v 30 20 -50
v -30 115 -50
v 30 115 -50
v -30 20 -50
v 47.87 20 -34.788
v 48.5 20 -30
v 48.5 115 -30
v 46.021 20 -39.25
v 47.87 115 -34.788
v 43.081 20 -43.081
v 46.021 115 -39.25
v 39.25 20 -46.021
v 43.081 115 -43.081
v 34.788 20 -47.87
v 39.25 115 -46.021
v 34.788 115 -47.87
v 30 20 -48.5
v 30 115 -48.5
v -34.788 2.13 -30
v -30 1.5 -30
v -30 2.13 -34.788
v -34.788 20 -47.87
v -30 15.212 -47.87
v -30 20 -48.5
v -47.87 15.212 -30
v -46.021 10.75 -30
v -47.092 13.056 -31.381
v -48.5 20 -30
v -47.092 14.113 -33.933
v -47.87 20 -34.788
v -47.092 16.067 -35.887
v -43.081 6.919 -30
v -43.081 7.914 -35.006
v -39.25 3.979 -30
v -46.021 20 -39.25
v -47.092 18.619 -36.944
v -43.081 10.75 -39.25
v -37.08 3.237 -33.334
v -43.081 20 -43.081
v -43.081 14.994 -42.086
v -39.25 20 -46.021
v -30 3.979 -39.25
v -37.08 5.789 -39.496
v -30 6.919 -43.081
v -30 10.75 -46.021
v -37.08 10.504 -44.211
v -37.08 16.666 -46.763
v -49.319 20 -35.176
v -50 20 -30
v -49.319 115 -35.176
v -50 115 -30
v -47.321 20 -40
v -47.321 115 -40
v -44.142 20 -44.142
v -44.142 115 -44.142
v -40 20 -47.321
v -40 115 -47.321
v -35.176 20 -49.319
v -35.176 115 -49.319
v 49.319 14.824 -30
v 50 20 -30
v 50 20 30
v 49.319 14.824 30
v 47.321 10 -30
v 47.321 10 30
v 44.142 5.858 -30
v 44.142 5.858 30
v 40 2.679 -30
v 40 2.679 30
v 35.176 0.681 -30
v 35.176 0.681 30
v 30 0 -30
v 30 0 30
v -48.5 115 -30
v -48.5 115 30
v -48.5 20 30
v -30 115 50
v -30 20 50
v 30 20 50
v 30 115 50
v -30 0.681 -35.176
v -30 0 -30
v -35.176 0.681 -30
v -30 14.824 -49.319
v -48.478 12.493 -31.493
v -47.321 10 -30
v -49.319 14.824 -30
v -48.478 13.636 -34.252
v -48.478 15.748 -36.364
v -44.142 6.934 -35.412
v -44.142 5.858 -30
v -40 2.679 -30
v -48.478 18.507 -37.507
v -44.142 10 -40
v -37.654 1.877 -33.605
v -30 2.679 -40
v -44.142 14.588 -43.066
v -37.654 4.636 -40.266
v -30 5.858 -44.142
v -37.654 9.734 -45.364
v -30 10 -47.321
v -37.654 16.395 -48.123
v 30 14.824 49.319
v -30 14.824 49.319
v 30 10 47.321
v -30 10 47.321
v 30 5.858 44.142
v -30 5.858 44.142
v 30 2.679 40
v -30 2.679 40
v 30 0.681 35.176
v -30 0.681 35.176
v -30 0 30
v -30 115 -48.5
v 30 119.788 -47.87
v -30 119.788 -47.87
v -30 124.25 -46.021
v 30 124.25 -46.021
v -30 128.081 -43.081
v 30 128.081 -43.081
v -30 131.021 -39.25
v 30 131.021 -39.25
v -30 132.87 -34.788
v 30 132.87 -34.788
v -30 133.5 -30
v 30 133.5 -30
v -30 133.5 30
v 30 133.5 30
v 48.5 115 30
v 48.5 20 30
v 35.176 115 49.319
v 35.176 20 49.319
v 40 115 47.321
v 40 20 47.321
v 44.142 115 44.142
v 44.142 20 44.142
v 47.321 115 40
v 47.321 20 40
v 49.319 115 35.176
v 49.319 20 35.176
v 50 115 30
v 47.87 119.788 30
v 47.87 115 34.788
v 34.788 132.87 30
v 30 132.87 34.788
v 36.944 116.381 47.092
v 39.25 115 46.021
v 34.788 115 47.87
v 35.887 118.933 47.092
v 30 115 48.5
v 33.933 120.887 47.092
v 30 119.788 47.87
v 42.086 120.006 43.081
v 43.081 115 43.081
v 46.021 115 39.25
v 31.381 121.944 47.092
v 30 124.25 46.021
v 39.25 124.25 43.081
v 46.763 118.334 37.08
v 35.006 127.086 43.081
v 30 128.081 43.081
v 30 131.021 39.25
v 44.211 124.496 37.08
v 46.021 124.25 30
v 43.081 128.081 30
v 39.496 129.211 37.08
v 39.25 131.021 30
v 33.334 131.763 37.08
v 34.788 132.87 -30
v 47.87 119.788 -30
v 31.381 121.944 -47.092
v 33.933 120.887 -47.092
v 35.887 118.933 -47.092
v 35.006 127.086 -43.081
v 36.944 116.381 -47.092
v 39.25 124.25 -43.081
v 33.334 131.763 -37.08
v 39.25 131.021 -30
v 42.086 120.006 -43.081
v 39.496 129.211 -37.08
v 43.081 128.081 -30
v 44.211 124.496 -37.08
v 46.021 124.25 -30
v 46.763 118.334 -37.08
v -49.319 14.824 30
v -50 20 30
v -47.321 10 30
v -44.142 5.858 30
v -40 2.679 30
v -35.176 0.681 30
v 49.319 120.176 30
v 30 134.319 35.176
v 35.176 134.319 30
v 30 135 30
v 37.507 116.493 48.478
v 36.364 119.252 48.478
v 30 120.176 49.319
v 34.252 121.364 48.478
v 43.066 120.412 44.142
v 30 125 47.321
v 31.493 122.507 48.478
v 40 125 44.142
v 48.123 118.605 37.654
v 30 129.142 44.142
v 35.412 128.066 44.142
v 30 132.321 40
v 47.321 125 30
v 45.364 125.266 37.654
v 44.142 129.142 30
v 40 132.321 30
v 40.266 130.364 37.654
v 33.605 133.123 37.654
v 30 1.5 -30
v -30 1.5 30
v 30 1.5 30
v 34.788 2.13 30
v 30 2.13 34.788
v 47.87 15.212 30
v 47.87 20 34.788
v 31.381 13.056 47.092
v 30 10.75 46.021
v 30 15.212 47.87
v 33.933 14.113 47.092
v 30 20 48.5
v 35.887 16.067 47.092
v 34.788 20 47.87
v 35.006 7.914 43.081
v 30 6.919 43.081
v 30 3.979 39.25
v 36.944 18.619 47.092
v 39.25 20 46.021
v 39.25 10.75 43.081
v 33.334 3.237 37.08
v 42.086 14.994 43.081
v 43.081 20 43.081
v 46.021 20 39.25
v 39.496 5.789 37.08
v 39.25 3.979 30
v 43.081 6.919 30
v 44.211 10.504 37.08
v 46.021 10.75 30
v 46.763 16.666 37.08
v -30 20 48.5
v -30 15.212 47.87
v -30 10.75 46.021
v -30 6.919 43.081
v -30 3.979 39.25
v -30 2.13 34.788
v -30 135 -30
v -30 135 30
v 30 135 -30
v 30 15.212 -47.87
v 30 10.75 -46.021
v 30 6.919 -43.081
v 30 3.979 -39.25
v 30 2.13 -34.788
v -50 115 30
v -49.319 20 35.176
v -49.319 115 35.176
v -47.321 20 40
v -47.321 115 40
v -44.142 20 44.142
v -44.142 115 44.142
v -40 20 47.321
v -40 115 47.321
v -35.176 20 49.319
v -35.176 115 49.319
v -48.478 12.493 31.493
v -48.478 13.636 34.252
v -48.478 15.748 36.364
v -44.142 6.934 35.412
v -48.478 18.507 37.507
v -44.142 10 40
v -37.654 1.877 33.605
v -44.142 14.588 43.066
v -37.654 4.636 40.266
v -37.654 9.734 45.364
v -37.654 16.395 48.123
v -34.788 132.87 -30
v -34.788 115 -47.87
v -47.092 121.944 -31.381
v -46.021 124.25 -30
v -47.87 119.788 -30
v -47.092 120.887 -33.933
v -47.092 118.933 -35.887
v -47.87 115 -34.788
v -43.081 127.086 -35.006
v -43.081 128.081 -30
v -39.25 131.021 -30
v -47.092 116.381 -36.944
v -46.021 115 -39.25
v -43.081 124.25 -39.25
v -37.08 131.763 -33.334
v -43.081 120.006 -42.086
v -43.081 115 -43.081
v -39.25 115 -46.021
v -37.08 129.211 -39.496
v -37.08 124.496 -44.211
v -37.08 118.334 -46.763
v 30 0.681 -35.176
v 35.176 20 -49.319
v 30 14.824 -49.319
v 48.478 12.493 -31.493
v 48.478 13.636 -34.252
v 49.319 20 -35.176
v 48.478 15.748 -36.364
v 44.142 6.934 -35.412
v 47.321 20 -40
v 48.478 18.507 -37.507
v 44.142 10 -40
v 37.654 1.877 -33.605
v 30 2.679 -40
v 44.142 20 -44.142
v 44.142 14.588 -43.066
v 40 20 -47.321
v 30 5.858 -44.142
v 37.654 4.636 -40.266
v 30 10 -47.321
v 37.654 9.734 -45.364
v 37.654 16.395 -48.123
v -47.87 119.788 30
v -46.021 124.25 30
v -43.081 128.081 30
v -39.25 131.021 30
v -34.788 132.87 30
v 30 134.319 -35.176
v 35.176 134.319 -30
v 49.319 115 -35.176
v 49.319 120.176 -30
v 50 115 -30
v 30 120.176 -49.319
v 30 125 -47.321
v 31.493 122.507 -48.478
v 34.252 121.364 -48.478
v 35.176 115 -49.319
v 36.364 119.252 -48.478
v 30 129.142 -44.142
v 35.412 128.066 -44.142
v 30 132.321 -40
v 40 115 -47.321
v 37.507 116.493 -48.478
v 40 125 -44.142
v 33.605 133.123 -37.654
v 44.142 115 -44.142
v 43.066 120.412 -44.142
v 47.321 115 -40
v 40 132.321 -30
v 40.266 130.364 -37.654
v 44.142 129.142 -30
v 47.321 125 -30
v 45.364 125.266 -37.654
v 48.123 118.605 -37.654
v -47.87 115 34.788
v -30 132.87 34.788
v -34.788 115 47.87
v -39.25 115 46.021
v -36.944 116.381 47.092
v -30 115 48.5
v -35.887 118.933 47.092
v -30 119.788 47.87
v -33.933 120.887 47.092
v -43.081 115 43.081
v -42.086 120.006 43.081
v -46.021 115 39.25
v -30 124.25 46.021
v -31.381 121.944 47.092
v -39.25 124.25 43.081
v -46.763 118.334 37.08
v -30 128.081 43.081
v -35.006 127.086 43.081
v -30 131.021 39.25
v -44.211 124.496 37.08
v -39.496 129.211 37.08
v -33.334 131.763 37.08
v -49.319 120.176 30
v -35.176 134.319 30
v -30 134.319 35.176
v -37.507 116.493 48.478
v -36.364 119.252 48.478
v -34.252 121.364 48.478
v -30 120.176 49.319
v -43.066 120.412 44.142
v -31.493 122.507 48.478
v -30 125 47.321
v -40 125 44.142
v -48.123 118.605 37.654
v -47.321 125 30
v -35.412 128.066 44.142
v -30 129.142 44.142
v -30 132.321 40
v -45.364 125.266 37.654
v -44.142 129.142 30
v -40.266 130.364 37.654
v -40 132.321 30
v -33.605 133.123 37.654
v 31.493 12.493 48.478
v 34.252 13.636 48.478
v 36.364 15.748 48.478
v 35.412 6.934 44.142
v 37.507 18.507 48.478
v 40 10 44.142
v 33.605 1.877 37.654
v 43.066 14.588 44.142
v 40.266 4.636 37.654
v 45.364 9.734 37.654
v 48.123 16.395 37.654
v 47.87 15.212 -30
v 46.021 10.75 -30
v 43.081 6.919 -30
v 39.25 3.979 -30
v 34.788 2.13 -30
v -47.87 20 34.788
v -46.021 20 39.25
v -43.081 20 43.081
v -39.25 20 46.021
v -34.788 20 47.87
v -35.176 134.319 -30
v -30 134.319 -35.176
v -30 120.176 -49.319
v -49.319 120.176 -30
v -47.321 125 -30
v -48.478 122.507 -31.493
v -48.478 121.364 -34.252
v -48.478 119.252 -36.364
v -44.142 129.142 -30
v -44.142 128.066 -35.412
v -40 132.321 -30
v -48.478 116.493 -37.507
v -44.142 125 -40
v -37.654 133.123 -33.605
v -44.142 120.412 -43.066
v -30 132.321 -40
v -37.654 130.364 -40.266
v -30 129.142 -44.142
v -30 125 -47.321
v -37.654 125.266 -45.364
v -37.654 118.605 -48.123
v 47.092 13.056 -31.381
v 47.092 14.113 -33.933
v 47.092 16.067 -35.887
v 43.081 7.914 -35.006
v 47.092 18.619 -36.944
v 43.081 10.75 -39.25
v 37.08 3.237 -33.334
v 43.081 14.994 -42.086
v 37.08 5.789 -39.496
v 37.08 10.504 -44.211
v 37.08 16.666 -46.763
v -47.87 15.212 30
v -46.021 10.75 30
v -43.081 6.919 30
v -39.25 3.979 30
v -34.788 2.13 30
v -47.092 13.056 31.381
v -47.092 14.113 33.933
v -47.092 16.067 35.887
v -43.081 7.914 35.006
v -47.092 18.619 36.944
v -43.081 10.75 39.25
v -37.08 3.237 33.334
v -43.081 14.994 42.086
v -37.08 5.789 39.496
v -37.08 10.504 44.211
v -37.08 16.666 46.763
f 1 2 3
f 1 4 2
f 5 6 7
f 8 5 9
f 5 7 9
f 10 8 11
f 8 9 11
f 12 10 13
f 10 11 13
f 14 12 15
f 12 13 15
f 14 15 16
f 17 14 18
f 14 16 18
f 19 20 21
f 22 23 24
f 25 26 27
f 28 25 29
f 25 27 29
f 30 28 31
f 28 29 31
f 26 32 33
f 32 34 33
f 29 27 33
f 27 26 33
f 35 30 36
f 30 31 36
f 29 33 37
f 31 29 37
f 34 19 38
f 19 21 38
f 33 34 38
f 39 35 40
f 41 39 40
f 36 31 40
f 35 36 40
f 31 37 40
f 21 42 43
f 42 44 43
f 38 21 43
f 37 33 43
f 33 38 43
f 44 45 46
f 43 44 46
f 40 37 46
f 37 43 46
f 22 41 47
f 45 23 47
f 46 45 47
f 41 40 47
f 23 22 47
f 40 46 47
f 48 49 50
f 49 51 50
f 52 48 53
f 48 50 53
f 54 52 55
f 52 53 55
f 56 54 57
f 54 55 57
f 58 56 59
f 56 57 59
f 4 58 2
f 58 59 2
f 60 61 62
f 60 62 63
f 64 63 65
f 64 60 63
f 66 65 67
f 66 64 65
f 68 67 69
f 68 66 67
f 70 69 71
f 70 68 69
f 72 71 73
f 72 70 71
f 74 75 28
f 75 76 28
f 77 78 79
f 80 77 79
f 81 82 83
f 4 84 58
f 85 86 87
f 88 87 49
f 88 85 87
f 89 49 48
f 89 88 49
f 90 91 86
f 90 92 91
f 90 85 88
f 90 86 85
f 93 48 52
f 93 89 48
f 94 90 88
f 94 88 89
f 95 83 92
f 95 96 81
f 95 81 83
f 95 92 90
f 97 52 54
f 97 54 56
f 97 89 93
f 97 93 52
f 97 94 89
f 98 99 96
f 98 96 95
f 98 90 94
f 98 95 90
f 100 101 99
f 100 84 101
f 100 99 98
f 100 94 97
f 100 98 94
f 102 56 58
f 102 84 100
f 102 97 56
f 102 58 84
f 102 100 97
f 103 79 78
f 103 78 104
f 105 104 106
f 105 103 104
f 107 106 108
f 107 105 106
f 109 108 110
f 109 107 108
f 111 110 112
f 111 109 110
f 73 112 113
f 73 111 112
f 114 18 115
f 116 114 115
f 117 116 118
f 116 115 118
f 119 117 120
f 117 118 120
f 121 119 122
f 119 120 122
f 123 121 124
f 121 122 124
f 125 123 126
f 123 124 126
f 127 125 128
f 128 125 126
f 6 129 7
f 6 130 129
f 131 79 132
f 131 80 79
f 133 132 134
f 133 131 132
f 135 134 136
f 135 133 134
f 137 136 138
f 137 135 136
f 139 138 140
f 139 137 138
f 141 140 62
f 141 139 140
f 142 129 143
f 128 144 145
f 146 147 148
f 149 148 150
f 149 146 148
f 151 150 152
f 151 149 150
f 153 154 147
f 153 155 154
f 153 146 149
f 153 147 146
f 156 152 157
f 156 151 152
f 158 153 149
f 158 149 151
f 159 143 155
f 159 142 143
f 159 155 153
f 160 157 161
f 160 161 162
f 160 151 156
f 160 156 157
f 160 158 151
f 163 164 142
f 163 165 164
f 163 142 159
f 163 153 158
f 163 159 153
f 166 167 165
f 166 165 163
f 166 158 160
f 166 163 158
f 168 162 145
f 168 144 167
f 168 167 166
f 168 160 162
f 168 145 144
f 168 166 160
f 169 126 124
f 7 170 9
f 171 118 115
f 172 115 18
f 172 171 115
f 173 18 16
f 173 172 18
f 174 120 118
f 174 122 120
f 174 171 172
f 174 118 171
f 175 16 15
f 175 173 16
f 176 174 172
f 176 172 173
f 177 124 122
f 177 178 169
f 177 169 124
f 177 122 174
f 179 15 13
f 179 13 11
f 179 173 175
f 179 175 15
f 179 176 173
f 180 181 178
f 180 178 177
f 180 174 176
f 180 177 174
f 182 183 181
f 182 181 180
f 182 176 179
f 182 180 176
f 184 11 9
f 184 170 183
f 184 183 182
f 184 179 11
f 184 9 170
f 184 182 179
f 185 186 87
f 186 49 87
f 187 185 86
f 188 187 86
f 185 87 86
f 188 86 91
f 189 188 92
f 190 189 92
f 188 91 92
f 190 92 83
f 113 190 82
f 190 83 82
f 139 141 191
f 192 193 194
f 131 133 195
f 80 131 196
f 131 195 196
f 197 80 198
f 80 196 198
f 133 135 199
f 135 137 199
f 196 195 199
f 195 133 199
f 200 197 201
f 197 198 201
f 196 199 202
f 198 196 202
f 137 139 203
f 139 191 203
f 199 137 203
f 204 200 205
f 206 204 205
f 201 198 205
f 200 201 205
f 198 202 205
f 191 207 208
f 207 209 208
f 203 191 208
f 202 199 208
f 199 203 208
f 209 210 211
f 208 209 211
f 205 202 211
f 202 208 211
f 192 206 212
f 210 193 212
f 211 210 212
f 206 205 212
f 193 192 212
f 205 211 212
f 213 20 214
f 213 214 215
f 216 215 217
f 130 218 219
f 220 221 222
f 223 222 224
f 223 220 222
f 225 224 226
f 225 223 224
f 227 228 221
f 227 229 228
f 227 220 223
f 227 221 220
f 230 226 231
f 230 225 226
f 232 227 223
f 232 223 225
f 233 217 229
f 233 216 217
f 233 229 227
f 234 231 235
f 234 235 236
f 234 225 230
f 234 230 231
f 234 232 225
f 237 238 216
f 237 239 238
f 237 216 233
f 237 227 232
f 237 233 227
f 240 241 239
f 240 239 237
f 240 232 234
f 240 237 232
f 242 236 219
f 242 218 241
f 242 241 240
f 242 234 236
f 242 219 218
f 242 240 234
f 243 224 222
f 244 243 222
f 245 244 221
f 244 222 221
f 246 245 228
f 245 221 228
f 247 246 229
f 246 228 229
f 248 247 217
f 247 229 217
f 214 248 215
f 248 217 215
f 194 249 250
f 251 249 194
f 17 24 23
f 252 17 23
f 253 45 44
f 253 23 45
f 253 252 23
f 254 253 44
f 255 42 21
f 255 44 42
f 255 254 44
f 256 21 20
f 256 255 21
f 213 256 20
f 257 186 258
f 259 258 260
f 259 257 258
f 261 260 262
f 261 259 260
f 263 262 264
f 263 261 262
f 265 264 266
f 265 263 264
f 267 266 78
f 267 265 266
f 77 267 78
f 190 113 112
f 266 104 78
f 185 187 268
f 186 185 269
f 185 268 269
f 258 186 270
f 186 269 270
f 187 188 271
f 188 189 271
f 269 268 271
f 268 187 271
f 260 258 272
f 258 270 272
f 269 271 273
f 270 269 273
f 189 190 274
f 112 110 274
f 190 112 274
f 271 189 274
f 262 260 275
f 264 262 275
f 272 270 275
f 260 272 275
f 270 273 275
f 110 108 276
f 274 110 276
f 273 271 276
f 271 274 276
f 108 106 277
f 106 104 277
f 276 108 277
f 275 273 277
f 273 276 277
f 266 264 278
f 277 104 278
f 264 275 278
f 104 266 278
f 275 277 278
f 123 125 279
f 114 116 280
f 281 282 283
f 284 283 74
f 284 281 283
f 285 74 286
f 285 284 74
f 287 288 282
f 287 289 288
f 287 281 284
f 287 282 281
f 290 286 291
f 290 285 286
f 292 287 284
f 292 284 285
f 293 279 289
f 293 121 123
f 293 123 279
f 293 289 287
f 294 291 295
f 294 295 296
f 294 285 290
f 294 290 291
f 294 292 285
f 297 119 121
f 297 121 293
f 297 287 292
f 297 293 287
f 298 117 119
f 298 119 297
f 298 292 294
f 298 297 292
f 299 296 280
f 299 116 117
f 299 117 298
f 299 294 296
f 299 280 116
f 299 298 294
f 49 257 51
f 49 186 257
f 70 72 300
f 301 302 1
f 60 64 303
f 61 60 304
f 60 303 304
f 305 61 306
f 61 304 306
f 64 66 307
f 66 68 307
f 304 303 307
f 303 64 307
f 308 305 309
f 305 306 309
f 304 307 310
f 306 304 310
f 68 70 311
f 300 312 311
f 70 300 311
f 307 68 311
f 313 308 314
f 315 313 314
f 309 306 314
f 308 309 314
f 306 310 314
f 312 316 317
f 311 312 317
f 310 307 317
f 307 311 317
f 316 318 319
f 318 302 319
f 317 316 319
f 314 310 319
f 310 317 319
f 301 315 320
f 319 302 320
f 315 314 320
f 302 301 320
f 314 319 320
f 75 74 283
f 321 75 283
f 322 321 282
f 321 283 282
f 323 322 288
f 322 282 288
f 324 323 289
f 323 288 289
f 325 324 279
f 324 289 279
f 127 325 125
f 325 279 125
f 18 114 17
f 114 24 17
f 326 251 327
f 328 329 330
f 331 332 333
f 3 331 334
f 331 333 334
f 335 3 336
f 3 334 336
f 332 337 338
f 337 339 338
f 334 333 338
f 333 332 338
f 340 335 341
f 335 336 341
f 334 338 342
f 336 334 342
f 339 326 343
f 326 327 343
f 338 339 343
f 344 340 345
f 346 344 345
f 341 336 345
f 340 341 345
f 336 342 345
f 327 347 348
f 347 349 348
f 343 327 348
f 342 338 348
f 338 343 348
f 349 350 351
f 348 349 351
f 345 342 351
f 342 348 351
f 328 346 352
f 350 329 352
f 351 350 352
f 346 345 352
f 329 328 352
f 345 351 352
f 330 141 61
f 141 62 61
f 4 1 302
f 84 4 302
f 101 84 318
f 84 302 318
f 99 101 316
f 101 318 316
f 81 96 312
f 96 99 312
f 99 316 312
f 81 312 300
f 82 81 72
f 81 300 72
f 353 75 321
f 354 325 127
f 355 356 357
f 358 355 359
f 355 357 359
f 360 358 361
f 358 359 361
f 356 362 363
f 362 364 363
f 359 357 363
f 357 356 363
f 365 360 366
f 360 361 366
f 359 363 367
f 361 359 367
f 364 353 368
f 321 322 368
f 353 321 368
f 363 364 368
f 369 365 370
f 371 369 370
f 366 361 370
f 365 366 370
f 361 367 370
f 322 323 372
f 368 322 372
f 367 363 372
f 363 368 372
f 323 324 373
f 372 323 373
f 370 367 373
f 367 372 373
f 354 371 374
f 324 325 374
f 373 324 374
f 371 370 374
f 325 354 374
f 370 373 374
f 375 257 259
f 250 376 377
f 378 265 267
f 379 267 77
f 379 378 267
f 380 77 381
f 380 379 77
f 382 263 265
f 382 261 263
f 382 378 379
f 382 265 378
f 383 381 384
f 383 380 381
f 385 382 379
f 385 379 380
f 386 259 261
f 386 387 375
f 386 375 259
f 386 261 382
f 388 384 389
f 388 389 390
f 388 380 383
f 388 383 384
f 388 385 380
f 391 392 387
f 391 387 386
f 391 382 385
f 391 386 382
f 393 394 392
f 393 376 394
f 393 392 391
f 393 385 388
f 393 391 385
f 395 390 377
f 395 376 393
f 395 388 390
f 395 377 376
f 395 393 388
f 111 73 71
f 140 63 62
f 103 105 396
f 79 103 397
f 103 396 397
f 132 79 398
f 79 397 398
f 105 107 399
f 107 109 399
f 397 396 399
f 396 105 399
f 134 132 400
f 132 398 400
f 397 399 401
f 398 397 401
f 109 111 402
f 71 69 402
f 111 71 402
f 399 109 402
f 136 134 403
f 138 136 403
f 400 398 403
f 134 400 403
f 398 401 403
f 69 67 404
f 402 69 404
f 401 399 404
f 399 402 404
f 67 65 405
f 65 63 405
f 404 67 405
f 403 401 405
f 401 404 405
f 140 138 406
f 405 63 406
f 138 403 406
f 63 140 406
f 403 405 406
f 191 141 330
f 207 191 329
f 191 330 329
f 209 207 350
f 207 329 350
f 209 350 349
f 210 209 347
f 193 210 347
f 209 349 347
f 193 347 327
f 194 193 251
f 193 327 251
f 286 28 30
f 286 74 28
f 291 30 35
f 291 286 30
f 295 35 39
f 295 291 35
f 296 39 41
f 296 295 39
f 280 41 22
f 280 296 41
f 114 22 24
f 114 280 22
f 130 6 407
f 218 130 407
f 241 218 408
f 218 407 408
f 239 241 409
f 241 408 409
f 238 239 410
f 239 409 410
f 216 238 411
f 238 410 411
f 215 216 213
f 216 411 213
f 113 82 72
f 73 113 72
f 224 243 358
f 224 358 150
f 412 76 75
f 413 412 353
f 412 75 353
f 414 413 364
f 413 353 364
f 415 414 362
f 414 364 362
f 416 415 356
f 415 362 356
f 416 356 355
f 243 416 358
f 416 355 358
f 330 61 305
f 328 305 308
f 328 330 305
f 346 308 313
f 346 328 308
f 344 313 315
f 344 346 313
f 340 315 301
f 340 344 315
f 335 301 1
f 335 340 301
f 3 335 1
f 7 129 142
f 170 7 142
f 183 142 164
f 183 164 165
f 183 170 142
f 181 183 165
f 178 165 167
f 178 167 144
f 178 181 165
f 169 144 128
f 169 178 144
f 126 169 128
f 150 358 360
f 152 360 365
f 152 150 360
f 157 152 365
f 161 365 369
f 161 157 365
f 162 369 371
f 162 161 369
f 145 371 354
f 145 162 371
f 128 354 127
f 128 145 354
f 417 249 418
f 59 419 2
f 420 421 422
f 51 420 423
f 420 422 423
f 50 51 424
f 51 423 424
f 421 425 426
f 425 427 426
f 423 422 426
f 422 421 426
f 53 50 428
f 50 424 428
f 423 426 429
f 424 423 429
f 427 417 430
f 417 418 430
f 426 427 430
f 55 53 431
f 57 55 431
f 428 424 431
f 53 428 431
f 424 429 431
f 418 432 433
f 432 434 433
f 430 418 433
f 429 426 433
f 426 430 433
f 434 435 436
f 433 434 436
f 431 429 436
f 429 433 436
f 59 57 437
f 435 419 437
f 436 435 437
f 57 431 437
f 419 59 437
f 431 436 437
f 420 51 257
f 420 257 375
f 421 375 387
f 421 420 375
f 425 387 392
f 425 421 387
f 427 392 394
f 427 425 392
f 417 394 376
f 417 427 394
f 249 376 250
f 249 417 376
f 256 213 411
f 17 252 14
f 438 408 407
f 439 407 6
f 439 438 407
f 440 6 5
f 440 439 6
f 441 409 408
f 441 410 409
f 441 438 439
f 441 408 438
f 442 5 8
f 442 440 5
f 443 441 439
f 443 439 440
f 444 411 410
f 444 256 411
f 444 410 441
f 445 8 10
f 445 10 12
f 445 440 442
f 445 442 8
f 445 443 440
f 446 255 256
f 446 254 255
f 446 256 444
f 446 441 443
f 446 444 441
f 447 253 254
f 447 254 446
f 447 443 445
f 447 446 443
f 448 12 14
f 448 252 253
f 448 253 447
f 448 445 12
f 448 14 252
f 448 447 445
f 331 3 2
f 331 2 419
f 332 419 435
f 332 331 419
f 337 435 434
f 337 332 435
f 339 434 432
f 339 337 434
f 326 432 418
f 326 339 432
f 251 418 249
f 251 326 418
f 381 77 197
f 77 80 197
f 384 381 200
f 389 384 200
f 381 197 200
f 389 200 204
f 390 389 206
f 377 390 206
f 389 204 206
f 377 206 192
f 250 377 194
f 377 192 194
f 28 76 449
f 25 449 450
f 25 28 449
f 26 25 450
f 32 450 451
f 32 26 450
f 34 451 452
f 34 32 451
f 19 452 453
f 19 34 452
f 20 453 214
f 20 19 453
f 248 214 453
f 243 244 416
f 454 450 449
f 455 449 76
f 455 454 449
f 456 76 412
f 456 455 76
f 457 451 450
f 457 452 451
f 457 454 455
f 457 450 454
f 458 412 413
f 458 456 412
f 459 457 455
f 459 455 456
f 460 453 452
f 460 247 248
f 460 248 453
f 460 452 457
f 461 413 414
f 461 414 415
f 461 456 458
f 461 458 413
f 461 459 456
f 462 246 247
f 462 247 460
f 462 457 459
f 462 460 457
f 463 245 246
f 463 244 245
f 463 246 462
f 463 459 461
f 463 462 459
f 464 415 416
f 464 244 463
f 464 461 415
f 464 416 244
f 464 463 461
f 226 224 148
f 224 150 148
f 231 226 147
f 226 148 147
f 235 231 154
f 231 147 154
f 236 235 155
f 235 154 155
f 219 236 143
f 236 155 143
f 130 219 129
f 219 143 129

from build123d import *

# Parameters (mm, degrees)
SKETCH1_W           = 100
SKETCH1_H           = 100
BOSS_EXTRUDE1_DEPTH = 135
FILLET1_R           = 20
SHELL1_T            = 1.5


with BuildPart() as part:
    # Sketch1 → Boss-Extrude1 (new body)
    with BuildSketch(Plane(origin=(0, 0, 0), x_dir=(1, 0, 0), z_dir=(0, 1, 0))):
        Rectangle(SKETCH1_W, SKETCH1_H)
    extrude(amount=BOSS_EXTRUDE1_DEPTH)

    # Fillet1
    fillet1_edges = [part.edges().sort_by_distance(p)[0] for p in [
        (50, 135, 0),
        (0, 135, -50),
        (-50, 135, 0),
        (0, 0, -50),
        (50, 0, 0),
        (0, 0, 50),
        (-50, 0, 0),
        (-50, 67.5, -50),
        (50, 67.5, -50),
        (50, 67.5, 50),
        (-50, 67.5, 50),
        (0, 135, 50),
    ]]
    fillet(fillet1_edges, radius=FILLET1_R)

    # Shell1 (no face opened: a closed hollow body)
    add(offset(amount=-SHELL1_T, mode=Mode.PRIVATE), mode=Mode.SUBTRACT)


solid = part.part
